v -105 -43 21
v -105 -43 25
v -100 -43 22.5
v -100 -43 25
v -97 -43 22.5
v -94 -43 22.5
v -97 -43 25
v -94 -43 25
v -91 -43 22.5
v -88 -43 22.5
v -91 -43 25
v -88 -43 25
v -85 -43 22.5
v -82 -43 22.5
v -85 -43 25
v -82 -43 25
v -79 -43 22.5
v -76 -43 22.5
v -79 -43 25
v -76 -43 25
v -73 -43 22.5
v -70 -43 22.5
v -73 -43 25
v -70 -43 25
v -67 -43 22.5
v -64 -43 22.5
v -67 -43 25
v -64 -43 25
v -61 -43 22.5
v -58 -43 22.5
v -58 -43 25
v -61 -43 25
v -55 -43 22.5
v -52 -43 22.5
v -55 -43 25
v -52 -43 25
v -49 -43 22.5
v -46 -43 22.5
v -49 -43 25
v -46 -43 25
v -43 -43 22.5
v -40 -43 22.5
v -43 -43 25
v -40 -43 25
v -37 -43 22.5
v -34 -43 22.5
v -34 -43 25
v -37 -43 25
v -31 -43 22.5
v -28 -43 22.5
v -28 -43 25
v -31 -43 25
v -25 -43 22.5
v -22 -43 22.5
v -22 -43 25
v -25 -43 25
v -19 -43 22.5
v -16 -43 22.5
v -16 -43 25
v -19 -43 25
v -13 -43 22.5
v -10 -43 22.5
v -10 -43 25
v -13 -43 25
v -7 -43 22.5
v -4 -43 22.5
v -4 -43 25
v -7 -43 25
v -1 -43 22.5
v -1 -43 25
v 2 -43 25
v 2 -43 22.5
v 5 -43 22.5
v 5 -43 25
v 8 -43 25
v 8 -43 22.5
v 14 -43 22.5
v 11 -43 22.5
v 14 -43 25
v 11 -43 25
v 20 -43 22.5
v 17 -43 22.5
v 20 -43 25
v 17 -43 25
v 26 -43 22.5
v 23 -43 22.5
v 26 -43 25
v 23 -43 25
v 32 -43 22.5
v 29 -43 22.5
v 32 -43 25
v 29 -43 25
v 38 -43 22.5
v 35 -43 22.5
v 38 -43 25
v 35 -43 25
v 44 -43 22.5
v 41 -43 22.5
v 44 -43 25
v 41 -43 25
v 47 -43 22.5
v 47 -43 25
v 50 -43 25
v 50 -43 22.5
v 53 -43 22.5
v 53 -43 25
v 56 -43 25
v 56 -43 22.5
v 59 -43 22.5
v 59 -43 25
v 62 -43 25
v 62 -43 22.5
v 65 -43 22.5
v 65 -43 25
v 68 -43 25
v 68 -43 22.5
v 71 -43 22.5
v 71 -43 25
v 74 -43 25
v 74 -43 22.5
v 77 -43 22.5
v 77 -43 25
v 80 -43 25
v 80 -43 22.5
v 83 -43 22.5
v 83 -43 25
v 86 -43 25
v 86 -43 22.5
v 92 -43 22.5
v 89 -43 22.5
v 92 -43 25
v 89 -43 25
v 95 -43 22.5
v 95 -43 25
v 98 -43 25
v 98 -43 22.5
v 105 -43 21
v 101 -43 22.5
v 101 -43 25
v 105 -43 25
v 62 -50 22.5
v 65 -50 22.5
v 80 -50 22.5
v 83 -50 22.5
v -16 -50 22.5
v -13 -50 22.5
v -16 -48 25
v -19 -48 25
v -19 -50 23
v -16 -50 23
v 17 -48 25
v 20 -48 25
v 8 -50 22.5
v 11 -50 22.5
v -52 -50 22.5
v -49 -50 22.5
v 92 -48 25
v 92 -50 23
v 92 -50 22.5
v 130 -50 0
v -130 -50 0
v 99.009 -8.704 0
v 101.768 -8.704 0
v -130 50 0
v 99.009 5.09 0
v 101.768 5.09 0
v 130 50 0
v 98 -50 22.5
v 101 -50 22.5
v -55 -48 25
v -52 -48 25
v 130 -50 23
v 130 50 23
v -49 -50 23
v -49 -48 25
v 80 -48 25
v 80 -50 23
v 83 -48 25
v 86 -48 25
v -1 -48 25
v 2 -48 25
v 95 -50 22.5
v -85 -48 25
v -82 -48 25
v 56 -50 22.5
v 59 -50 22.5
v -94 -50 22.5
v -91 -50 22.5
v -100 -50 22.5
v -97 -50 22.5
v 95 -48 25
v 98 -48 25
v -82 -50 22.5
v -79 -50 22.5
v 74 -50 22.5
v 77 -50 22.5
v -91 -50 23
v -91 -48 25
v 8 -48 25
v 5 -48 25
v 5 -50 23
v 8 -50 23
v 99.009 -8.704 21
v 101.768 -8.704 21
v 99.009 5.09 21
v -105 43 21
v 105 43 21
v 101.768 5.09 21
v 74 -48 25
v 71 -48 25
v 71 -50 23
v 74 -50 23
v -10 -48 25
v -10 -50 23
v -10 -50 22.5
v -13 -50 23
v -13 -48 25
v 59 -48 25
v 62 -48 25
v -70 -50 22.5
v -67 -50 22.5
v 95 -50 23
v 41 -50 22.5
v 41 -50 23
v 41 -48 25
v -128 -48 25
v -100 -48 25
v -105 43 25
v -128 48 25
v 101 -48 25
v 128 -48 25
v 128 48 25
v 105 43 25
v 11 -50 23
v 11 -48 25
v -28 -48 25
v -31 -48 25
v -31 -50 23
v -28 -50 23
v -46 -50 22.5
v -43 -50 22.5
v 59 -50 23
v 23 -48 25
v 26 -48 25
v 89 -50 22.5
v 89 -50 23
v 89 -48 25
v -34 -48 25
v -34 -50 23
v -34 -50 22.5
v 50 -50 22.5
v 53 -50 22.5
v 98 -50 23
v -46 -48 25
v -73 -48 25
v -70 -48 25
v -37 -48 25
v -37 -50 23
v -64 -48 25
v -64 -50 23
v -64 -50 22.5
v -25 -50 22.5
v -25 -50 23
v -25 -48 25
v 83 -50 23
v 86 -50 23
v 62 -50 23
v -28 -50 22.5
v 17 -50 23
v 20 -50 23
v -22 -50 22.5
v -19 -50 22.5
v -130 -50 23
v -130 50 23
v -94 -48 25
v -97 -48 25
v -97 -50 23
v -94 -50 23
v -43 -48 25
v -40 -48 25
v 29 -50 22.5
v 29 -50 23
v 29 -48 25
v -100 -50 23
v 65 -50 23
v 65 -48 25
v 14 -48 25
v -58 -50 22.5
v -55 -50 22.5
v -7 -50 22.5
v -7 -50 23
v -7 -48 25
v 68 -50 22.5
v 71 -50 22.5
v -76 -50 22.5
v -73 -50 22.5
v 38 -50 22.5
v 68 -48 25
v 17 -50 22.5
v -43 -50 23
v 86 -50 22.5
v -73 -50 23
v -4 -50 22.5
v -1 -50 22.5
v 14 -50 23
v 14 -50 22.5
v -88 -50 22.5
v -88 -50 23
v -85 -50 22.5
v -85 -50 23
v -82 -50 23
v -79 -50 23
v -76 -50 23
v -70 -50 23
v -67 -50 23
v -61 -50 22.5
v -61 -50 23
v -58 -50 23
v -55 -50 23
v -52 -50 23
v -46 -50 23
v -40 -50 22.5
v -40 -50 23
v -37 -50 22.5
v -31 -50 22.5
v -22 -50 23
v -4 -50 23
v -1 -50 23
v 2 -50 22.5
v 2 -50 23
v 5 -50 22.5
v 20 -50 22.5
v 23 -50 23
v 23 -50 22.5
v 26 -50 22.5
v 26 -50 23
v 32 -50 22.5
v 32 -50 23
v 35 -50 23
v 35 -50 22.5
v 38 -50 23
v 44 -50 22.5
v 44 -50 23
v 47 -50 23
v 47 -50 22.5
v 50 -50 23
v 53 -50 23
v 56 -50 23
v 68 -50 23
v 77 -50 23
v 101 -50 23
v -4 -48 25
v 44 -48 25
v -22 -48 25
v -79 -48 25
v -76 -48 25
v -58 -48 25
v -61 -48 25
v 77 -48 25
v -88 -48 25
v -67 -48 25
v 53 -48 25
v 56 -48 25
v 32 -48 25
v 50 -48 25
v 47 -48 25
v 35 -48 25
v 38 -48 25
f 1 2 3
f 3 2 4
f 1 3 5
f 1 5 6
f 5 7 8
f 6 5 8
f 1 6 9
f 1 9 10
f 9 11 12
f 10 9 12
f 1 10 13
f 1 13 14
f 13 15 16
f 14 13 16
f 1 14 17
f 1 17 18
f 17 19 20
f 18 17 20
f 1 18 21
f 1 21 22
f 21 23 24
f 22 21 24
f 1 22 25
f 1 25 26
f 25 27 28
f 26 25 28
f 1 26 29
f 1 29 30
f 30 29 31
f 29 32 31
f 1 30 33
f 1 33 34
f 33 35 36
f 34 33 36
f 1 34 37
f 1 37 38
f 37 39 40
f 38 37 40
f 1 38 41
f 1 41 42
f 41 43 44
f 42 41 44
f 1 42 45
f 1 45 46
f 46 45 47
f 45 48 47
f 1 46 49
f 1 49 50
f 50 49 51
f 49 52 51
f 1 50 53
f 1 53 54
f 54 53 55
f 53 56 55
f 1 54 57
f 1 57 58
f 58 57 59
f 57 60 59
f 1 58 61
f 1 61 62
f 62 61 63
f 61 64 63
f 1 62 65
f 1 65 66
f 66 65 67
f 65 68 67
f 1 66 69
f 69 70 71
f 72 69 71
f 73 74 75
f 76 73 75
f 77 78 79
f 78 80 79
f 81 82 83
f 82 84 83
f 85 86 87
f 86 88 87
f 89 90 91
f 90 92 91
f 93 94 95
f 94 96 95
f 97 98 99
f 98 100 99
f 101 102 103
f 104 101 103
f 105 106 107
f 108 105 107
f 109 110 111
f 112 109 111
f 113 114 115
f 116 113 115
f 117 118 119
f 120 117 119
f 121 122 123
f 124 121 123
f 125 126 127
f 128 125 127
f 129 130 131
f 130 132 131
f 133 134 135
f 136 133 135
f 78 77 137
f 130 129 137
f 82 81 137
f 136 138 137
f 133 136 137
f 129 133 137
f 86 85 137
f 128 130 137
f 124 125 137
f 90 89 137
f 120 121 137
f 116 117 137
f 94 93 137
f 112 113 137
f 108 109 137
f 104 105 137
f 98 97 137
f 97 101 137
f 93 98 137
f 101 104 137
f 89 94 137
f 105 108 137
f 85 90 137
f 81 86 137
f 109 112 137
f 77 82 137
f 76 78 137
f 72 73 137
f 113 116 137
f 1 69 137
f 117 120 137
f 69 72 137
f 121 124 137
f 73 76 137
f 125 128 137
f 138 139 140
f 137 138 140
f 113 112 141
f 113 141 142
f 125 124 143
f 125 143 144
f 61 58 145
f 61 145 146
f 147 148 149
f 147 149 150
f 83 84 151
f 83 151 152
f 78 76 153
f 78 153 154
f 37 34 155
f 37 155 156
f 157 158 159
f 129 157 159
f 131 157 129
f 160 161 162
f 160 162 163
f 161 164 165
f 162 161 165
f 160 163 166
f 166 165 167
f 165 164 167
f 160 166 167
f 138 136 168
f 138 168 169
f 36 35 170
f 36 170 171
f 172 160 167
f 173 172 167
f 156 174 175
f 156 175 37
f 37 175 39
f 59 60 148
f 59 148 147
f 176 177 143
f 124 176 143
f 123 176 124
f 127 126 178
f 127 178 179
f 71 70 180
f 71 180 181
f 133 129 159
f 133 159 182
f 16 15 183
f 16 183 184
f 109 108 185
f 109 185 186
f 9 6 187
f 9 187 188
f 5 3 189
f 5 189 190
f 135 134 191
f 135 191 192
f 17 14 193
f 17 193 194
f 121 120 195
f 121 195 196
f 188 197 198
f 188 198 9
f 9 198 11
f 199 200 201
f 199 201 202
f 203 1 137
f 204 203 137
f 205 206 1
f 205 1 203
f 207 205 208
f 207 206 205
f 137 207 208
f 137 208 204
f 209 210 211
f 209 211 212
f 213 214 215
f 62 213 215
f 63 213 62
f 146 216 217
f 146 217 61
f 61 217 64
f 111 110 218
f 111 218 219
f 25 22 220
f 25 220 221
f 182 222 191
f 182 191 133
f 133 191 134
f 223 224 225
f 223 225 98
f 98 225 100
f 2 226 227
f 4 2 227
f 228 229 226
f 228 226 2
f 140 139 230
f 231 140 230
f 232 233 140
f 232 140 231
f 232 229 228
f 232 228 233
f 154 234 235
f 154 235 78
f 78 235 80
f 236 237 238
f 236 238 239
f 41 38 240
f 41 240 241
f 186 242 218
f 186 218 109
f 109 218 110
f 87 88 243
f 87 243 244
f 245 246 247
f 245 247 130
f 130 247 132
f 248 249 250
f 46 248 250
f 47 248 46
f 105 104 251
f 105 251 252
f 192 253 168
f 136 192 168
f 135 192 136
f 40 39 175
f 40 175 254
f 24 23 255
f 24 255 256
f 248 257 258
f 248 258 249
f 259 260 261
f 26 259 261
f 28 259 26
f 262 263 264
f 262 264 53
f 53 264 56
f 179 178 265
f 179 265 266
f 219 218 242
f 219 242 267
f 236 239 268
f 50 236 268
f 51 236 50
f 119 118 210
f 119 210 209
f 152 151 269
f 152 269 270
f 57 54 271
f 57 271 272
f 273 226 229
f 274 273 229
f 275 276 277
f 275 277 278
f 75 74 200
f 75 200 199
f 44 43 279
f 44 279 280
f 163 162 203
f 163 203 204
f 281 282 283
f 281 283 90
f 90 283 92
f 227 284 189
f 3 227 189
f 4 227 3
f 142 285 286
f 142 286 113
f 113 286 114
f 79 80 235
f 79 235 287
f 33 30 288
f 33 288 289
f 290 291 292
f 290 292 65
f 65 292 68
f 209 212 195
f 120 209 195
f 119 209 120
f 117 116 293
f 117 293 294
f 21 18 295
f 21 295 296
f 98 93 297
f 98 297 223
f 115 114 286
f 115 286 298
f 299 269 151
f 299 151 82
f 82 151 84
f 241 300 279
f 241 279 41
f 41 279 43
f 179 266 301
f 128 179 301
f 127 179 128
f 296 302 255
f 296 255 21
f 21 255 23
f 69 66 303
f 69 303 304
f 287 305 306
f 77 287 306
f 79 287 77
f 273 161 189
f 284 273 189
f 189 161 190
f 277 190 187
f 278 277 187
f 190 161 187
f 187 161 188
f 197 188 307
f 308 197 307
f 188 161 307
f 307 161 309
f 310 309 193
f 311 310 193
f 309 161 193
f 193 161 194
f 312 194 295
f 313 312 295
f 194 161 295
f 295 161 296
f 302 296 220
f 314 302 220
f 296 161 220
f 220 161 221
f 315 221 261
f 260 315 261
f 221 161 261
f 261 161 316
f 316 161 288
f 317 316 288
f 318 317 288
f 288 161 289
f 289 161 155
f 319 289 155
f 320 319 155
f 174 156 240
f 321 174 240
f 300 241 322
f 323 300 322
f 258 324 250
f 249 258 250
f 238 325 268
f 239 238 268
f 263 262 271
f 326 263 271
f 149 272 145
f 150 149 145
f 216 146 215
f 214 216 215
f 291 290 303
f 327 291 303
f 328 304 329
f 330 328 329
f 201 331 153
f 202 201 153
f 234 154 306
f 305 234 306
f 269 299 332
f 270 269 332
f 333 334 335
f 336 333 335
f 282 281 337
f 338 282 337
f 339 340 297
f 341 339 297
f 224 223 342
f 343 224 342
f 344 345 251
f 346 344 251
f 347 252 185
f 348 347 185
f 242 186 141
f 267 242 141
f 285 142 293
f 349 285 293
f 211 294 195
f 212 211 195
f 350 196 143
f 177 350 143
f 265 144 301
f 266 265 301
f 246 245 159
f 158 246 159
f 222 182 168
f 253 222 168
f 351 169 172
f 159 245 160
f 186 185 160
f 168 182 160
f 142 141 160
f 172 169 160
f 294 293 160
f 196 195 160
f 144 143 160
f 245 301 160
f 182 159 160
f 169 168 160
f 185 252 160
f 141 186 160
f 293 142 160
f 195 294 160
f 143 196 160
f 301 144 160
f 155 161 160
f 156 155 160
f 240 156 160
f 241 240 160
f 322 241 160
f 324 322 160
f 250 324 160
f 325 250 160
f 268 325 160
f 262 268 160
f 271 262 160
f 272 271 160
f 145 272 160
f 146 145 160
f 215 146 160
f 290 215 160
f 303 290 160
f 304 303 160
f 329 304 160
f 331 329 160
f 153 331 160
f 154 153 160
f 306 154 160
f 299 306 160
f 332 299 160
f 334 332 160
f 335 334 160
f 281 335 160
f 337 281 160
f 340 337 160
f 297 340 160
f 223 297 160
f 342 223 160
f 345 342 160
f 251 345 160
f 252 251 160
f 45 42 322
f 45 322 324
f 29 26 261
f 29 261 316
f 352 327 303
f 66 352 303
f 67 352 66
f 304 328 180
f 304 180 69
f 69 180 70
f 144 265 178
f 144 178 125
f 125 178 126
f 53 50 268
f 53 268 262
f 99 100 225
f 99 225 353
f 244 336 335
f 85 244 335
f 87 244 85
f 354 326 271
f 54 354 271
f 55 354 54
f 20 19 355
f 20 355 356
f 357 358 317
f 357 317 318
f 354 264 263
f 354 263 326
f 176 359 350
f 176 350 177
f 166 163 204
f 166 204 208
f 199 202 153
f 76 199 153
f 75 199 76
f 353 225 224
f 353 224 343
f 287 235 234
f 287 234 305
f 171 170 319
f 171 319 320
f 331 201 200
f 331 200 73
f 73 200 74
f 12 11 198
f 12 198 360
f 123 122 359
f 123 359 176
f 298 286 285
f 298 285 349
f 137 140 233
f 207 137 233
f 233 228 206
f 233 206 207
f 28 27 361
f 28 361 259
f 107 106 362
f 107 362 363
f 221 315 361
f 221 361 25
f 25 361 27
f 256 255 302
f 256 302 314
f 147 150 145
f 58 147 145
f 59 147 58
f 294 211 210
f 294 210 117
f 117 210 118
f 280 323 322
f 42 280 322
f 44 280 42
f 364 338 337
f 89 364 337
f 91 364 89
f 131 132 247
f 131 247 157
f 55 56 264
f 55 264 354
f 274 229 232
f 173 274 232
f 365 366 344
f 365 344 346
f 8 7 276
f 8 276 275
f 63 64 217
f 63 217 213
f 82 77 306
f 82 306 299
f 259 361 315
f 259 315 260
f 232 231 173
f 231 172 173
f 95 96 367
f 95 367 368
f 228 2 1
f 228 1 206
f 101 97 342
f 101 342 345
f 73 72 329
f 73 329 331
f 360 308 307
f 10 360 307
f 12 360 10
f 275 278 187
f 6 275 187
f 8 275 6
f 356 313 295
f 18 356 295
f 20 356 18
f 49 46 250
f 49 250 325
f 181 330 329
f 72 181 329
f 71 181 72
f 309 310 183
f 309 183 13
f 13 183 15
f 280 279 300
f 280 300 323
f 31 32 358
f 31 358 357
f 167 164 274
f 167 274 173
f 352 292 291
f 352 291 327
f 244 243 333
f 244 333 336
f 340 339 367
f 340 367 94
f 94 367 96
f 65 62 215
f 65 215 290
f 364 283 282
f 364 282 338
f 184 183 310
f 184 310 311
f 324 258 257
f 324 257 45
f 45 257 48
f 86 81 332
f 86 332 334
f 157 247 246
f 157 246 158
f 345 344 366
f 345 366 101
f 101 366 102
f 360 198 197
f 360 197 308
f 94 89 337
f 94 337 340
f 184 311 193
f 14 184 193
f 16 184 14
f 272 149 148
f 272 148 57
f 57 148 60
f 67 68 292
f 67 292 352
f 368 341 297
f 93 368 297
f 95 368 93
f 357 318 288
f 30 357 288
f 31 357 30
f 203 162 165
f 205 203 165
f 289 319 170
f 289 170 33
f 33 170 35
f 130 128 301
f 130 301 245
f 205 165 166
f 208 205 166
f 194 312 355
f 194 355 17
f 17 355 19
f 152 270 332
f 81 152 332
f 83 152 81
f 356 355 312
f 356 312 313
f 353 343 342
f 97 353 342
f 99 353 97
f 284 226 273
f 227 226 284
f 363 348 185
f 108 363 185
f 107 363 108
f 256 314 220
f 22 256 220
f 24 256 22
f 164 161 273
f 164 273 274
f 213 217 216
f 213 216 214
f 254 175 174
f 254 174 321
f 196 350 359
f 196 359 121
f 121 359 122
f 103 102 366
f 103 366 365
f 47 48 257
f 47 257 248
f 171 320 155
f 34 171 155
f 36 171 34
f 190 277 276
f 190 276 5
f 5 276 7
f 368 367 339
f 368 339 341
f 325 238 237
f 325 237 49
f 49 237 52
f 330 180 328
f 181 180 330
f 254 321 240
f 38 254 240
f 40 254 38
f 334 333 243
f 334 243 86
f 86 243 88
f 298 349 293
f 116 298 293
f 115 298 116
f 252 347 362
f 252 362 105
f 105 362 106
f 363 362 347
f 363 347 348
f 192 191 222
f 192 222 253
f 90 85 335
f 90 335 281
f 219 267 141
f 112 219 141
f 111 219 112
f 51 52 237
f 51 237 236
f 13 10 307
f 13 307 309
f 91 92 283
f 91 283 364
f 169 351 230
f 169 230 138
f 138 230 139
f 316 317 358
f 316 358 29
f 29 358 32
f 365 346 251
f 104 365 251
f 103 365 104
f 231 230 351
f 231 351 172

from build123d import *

# Parameters (mm, degrees)
F0_W     = 260
F0_H     = 100
F1_DEPTH = 25
F2_W     = 210
F2_H     = 86
F3_DEPTH = 4
F4_W     = 3
F4_H     = 15
F5_DEPTH = 2.5
F7_SIZE  = 2
F8_SIZE  = 2
F6_W     = 2.758801
F6_H     = 13.793992
F9_DEPTH = 25


with BuildPart() as f1:
    # F0 (on Top) → F1 (new body)
    with BuildSketch(Plane.XY):
        Rectangle(F0_W, F0_H)
    extrude(amount=F1_DEPTH)

    # F2 (on face) → F3 (cut)
    with BuildSketch(Plane.XY.offset(25)):
        Rectangle(F2_W, F2_H)
    extrude(amount=-F3_DEPTH, mode=Mode.SUBTRACT)

    # F4 (on face) → F5 (cut)
    with BuildSketch(Plane.XY.offset(25)):
        with Locations((-98.5, -50.5)):
            Rectangle(F4_W, F4_H)
        with Locations((-92.5, -50.5)):
            Rectangle(F4_W, F4_H)
        with Locations((-86.5, -50.5)):
            Rectangle(F4_W, F4_H)
        with Locations((-80.5, -50.5)):
            Rectangle(F4_W, F4_H)
        with Locations((-74.5, -50.5)):
            Rectangle(F4_W, F4_H)
        with Locations((-68.5, -50.5)):
            Rectangle(F4_W, F4_H)
        with Locations((-62.5, -50.5)):
            Rectangle(F4_W, F4_H)
        with Locations((-56.5, -50.5)):
            Rectangle(F4_W, F4_H)
        with Locations((-50.5, -50.5)):
            Rectangle(F4_W, F4_H)
        with Locations((-44.5, -50.5)):
            Rectangle(F4_W, F4_H)
        with Locations((-38.5, -50.5)):
            Rectangle(F4_W, F4_H)
        with Locations((-32.5, -50.5)):
            Rectangle(F4_W, F4_H)
        with Locations((-26.5, -50.5)):
            Rectangle(F4_W, F4_H)
        with Locations((-20.5, -50.5)):
            Rectangle(F4_W, F4_H)
        with Locations((-14.5, -50.5)):
            Rectangle(F4_W, F4_H)
        with Locations((-8.5, -50.5)):
            Rectangle(F4_W, F4_H)
        with Locations((-2.5, -50.5)):
            Rectangle(F4_W, F4_H)
        with Locations((3.5, -50.5)):
            Rectangle(F4_W, F4_H)
        with Locations((9.5, -50.5)):
            Rectangle(F4_W, F4_H)
        with Locations((15.5, -50.5)):
            Rectangle(F4_W, F4_H)
        with Locations((21.5, -50.5)):
            Rectangle(F4_W, F4_H)
        with Locations((27.5, -50.5)):
            Rectangle(F4_W, F4_H)
        with Locations((33.5, -50.5)):
            Rectangle(F4_W, F4_H)
        with Locations((39.5, -50.5)):
            Rectangle(F4_W, F4_H)
        with Locations((45.5, -50.5)):
            Rectangle(F4_W, F4_H)
        with Locations((51.5, -50.5)):
            Rectangle(F4_W, F4_H)
        with Locations((57.5, -50.5)):
            Rectangle(F4_W, F4_H)
        with Locations((63.5, -50.5)):
            Rectangle(F4_W, F4_H)
        with Locations((69.5, -50.5)):
            Rectangle(F4_W, F4_H)
        with Locations((75.5, -50.5)):
            Rectangle(F4_W, F4_H)
        with Locations((81.5, -50.5)):
            Rectangle(F4_W, F4_H)
        with Locations((87.5, -50.5)):
            Rectangle(F4_W, F4_H)
        with Locations((93.5, -50.5)):
            Rectangle(F4_W, F4_H)
        with Locations((99.5, -50.5)):
            Rectangle(F4_W, F4_H)
    extrude(amount=-F5_DEPTH, mode=Mode.SUBTRACT)

    # F7
    f7_edges = [f1.edges().sort_by_distance(p)[0] for p in [
        (130, 0, 25),
        (0, 50, 25),
        (0.5, -50, 25),
        (-130, 0, 25),
    ]]
    chamfer(f7_edges, length=F7_SIZE)

    # F8
    f8_edges = [f1.edges().sort_by_distance(p)[0] for p in [
        (114.5, -50, 25),
        (-114, -50, 25),
        (96.5, -50, 25),
        (-95.5, -50, 25),
        (90.5, -50, 25),
        (-89.5, -50, 25),
        (84.5, -50, 25),
        (-83.5, -50, 25),
        (78.5, -50, 25),
        (-77.5, -50, 25),
        (72.5, -50, 25),
        (-71.5, -50, 25),
        (66.5, -50, 25),
        (-65.5, -50, 25),
        (60.5, -50, 25),
        (-59.5, -50, 25),
        (54.5, -50, 25),
        (-53.5, -50, 25),
        (48.5, -50, 25),
        (-47.5, -50, 25),
        (42.5, -50, 25),
        (-41.5, -50, 25),
        (36.5, -50, 25),
        (-35.5, -50, 25),
        (30.5, -50, 25),
        (-29.5, -50, 25),
        (24.5, -50, 25),
        (-23.5, -50, 25),
        (18.5, -50, 25),
        (-17.5, -50, 25),
        (12.5, -50, 25),
        (-11.5, -50, 25),
        (6.5, -50, 25),
        (-5.5, -50, 25),
    ]]
    chamfer(f8_edges, length=F8_SIZE)

    # F6 (on face) → F9 (cut)
    with BuildSketch(Plane.XY.offset(21)):
        with Locations((100.388251, -1.806707)):
            Rectangle(F6_W, F6_H)
    extrude(amount=-F9_DEPTH, mode=Mode.SUBTRACT)


solid = f1.part
